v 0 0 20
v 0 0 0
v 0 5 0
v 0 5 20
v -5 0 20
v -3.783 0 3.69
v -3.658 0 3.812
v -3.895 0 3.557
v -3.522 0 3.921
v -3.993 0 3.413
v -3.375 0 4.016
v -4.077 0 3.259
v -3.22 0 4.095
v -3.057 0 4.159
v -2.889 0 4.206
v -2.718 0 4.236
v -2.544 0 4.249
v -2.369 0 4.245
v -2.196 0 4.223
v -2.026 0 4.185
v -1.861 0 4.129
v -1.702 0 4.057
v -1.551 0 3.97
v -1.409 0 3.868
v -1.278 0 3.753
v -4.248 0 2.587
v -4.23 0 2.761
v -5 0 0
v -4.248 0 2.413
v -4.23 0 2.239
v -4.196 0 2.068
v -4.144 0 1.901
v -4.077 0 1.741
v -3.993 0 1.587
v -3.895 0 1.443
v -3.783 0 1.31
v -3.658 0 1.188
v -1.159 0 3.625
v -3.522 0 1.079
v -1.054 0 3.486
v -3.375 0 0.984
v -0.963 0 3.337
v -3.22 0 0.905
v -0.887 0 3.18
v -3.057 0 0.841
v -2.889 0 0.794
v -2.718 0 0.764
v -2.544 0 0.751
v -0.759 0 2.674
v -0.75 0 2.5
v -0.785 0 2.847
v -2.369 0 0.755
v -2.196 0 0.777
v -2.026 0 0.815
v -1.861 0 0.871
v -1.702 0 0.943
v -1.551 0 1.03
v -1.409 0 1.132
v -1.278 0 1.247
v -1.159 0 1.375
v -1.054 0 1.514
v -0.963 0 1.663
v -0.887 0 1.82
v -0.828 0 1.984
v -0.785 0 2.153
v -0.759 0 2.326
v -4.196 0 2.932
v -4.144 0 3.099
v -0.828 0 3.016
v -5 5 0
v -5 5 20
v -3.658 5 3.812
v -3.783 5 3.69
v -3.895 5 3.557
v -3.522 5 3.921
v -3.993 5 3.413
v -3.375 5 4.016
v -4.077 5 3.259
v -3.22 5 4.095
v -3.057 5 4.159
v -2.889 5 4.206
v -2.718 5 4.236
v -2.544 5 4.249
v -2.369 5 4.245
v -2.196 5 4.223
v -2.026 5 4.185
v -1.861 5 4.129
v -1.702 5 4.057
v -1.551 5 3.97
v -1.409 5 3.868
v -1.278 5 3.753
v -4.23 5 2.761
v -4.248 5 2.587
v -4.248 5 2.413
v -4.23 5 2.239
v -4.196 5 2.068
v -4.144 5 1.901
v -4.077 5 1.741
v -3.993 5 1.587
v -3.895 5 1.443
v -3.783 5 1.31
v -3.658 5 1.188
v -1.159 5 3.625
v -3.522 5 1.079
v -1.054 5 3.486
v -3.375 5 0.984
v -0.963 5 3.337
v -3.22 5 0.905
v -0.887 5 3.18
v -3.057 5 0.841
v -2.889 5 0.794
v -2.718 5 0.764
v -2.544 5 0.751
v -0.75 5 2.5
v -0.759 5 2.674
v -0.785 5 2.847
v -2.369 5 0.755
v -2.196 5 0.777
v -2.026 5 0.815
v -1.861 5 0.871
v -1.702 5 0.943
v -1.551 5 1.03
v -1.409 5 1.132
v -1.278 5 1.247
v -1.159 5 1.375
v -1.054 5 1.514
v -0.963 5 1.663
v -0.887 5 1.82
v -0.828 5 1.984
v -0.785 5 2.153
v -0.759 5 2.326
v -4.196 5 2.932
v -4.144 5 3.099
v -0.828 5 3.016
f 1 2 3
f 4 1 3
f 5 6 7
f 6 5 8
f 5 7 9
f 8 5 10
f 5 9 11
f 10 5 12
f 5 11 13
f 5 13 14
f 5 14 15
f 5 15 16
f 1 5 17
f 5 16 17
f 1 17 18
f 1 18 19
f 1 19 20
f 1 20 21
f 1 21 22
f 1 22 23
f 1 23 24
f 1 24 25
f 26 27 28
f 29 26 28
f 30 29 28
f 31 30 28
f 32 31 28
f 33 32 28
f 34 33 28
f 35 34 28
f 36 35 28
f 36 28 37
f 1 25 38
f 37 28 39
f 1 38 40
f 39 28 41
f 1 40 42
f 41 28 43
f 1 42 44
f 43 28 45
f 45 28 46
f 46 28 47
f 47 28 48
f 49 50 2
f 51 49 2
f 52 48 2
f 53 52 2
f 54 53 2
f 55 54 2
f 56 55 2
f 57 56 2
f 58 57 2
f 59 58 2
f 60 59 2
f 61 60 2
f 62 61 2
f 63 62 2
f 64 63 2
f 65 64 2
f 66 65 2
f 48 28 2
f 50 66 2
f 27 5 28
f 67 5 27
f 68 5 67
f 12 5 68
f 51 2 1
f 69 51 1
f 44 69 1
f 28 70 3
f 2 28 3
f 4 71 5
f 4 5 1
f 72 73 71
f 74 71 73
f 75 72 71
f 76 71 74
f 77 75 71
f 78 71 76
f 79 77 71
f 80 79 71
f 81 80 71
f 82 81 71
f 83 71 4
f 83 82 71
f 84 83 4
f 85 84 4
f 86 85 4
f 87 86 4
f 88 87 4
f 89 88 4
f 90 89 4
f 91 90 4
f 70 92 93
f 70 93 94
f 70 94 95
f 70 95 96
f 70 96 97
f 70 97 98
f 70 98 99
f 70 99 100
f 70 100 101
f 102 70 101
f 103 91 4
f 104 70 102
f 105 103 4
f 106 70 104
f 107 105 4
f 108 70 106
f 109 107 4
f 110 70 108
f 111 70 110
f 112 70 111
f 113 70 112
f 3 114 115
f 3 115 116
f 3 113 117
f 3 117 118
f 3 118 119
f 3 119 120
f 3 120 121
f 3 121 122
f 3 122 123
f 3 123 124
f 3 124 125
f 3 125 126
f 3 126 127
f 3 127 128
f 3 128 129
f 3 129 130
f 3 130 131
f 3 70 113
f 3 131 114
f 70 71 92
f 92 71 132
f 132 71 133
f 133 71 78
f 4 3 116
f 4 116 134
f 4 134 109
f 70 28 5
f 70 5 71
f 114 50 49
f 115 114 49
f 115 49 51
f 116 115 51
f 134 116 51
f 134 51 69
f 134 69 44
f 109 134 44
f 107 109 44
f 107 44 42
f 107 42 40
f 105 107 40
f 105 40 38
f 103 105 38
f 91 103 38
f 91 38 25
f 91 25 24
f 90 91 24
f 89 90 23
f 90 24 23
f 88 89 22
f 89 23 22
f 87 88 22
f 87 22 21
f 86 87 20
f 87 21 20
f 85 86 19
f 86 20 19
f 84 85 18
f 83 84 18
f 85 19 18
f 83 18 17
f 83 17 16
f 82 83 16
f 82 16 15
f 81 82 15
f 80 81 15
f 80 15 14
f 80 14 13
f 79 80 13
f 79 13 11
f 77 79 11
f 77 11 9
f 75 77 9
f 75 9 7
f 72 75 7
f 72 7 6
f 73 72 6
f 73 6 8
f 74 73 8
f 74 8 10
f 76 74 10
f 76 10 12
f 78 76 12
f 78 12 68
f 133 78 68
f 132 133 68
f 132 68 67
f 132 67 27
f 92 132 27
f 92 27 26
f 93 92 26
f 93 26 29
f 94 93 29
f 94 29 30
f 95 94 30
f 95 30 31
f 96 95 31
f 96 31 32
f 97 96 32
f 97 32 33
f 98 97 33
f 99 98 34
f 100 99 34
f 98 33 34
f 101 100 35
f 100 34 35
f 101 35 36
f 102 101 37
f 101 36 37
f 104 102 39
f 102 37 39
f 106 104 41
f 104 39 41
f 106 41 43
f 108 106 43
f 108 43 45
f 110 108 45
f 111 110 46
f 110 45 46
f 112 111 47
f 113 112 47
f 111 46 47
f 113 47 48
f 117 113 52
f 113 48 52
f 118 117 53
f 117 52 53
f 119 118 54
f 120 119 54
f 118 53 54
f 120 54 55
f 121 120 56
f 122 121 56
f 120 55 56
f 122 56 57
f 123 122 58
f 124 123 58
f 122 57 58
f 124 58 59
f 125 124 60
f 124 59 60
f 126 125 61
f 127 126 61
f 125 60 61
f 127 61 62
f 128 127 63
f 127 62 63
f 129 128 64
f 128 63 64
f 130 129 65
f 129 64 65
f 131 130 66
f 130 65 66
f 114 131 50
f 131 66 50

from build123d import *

# Parameters (mm, degrees)
SCHIZZO1_W                   = 5
SCHIZZO1_H                   = 5
ESTRUSIONE_ESTRUSIONE1_DEPTH = 20
SCHIZZO2_R                   = 1.75
TAGLIO_ESTRUSIONE1_DEPTH     = 22.213203436


with BuildPart() as part:
    # Schizzo1 → Estrusione-Estrusione1 (new body)
    with BuildSketch(Plane.XY):
        with Locations((-2.5, 2.5)):
            Rectangle(SCHIZZO1_W, SCHIZZO1_H)
    extrude(amount=ESTRUSIONE_ESTRUSIONE1_DEPTH)

    # Schizzo2 → Taglio-Estrusione1 (cut, through all)
    with BuildSketch(Plane(origin=(0, 0, 0), x_dir=(-1, 0, 0), z_dir=(0, -1, 0))):
        with Locations((2.5, -27.5)):
            Circle(SCHIZZO2_R)
        with Locations(Location((2.5, -2.5, 0), (0, 0, 180))):
            Circle(SCHIZZO2_R)
    extrude(amount=-TAGLIO_ESTRUSIONE1_DEPTH, mode=Mode.SUBTRACT)


solid = part.part
